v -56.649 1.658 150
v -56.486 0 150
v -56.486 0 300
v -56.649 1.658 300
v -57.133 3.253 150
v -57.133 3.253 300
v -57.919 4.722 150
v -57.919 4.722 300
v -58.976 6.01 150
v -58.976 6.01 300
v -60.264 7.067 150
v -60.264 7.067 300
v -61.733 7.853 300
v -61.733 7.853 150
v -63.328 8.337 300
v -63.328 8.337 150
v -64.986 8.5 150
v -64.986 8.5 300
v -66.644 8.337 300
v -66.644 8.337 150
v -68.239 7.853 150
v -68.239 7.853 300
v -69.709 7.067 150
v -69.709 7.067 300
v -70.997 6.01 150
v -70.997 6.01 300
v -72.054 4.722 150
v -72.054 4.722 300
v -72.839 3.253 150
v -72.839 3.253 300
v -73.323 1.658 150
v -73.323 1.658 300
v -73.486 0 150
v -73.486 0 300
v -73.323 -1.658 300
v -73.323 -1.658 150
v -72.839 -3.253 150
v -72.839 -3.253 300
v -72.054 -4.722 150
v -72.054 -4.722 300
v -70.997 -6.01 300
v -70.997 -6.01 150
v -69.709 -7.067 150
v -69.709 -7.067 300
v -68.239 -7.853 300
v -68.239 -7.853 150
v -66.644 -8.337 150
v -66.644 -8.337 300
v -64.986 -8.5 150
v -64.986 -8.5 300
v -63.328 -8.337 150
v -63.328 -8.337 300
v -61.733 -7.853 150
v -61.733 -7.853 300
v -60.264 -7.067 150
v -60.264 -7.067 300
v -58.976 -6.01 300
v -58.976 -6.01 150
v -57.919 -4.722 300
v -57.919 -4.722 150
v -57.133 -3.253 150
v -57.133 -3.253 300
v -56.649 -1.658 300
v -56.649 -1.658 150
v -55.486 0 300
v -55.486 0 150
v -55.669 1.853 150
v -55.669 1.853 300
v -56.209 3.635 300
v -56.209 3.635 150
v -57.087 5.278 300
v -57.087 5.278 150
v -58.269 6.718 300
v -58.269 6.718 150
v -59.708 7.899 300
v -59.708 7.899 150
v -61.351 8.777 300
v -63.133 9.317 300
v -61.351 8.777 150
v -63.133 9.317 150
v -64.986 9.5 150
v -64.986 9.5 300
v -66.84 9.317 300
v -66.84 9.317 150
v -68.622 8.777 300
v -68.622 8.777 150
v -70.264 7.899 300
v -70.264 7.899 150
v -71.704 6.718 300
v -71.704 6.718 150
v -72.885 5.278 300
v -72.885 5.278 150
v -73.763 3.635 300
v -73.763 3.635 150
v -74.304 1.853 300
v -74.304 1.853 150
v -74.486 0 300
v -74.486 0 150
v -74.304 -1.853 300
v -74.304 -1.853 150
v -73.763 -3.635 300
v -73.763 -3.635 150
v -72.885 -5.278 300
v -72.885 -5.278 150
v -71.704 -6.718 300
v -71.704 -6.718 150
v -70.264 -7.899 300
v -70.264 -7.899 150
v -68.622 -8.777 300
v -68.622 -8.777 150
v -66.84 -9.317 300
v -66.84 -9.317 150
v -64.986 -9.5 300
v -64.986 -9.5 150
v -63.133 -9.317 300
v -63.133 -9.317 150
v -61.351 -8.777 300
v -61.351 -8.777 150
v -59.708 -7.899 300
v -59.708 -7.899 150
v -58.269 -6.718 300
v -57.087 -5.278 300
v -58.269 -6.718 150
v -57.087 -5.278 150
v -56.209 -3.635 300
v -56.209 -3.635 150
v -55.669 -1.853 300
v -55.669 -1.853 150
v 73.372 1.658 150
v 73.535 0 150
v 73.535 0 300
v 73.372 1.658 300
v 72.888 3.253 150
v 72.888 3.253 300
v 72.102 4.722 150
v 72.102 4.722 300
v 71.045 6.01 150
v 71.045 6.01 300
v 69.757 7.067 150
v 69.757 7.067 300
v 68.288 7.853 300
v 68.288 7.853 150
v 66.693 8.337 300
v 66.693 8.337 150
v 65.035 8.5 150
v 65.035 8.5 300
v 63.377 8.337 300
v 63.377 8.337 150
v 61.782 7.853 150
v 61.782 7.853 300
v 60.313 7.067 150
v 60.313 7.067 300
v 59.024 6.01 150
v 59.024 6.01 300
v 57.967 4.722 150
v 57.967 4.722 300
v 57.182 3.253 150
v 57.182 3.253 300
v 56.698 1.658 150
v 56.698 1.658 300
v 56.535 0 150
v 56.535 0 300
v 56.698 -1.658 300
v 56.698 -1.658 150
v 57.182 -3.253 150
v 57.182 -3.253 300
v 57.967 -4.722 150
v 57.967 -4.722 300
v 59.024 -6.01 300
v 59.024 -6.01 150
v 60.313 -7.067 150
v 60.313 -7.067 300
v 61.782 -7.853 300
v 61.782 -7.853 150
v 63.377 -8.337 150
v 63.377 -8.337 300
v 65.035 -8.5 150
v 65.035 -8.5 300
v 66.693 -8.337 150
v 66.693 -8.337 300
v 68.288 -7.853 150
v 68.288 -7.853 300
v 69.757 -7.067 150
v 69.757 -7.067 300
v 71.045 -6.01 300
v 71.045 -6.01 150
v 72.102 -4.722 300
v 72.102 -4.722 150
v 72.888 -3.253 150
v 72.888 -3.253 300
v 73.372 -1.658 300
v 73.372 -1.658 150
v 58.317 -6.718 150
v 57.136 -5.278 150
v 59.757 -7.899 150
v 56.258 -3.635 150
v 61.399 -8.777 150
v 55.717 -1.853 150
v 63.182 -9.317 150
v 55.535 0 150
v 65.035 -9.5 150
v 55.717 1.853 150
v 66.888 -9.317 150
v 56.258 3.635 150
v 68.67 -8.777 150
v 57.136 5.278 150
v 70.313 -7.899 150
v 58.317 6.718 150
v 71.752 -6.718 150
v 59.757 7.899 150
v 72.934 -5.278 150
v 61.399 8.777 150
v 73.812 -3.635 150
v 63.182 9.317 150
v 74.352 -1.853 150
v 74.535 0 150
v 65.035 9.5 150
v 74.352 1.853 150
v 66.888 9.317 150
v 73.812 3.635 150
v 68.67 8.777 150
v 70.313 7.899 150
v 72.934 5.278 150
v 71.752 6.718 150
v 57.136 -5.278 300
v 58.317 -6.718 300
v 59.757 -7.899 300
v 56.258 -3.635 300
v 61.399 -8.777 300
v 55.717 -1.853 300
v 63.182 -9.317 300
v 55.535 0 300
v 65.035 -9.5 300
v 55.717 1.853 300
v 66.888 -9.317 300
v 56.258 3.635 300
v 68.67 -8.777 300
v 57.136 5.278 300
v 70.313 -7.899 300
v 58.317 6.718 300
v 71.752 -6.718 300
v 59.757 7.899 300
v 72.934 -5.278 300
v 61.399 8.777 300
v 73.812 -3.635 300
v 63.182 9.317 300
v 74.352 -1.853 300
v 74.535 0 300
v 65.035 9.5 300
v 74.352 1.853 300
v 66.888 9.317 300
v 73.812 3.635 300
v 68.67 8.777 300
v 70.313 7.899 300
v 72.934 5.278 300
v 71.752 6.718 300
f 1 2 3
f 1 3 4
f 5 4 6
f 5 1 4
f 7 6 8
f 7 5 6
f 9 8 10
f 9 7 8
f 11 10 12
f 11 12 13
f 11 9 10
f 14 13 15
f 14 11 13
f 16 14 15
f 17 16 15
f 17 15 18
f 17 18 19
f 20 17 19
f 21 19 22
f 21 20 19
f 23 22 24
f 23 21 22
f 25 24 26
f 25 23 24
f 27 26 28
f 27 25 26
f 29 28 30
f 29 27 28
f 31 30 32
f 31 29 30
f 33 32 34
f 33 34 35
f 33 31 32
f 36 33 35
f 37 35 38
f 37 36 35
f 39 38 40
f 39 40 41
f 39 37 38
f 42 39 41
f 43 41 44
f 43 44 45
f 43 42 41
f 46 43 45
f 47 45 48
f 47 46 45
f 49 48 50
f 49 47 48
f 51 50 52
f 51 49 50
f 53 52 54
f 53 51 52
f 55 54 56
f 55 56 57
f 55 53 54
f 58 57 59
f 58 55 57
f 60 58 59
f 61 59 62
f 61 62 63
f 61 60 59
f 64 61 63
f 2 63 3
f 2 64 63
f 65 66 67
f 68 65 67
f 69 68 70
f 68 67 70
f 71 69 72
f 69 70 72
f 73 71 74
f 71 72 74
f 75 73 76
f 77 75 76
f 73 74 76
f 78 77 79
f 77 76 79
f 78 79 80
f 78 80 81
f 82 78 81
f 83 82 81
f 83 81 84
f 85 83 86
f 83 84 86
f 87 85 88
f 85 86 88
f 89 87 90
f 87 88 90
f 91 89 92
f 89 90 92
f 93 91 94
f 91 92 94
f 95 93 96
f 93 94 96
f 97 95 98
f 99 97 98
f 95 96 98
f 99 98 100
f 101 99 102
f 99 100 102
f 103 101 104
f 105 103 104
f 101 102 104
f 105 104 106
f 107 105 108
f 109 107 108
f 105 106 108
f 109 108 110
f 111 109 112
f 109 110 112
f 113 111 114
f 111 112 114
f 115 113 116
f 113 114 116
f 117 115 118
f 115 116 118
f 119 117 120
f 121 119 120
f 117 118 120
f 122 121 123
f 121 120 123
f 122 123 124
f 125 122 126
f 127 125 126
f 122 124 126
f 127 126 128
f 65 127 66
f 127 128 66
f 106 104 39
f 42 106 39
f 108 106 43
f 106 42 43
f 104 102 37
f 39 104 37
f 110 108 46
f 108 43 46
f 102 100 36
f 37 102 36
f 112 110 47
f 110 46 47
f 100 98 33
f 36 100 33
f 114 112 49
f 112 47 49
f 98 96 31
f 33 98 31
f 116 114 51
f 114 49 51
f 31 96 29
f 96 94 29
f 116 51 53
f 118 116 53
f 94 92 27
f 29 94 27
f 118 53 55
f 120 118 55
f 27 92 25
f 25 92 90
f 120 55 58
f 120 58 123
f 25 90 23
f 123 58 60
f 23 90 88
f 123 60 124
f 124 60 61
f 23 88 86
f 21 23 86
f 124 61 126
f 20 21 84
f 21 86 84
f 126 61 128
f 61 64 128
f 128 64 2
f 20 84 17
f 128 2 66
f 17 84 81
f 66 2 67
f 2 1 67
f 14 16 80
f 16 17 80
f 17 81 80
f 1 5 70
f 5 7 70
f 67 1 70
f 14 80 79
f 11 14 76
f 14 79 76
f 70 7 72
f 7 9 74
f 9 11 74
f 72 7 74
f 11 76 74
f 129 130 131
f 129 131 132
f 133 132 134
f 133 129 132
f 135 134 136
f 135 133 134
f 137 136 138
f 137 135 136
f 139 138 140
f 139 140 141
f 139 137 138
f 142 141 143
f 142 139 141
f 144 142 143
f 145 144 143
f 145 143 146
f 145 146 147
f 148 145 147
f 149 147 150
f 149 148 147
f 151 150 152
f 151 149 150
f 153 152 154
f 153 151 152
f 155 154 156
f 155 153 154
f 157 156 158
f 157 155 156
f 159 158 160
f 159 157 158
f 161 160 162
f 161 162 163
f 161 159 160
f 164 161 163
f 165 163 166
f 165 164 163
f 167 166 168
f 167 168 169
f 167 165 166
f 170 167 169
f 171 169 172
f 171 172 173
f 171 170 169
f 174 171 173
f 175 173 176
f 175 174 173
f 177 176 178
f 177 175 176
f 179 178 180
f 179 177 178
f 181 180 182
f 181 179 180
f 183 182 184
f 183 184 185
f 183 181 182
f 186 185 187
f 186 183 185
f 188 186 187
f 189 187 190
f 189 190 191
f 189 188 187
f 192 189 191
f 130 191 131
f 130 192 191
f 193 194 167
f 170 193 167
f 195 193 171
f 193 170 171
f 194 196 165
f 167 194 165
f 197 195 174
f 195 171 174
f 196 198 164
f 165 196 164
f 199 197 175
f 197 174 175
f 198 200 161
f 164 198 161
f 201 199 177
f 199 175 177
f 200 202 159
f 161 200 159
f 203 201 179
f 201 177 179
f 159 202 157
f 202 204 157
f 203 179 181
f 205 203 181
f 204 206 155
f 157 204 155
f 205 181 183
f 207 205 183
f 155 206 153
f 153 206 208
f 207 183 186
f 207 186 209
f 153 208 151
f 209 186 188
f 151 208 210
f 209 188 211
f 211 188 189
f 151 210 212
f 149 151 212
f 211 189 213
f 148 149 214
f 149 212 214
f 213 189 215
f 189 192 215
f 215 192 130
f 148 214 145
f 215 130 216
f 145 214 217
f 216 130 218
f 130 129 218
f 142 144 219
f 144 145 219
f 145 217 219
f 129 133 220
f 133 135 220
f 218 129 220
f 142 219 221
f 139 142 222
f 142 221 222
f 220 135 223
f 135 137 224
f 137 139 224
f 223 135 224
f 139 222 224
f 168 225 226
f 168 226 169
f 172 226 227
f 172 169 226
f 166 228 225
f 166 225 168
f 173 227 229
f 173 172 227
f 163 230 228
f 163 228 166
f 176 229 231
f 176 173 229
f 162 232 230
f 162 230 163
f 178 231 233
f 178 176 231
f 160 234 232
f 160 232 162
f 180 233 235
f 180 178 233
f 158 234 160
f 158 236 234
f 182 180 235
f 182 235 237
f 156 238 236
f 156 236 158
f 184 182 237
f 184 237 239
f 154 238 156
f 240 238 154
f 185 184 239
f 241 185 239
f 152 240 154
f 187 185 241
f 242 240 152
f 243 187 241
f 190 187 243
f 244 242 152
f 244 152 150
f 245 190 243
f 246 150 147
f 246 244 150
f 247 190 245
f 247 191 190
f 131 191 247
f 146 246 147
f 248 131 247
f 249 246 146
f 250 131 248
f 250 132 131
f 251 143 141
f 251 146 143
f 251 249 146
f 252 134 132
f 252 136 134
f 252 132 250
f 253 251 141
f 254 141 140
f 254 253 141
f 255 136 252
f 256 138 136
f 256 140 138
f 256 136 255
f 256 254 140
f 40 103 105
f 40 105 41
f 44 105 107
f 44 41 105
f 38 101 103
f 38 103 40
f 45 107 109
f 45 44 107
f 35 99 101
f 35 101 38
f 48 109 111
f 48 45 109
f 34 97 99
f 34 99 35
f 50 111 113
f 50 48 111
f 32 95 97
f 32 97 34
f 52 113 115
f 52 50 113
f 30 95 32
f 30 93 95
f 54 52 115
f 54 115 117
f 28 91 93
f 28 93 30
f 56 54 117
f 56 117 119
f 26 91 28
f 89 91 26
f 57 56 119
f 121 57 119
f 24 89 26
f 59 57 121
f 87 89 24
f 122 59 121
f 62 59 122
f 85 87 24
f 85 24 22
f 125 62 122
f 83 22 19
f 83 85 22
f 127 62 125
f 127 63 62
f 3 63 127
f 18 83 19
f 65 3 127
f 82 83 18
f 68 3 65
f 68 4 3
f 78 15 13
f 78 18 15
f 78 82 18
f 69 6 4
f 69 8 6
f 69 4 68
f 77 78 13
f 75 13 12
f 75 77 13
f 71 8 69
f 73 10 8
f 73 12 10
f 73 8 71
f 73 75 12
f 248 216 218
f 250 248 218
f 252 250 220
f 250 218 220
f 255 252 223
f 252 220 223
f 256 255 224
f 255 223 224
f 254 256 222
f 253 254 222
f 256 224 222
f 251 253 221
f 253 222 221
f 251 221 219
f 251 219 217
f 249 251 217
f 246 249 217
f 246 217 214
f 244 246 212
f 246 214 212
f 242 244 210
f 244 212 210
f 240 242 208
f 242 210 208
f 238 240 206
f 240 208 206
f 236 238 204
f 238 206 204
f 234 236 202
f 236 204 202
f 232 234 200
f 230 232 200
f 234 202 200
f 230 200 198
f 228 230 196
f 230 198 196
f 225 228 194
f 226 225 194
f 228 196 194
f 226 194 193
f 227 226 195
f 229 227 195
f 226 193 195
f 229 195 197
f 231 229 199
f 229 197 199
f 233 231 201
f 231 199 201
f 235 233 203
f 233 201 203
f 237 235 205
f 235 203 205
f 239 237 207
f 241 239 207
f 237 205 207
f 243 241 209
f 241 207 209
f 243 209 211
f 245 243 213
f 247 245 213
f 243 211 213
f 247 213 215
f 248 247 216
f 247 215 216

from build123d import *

# Parameters (mm, degrees)
F0_R     = 75
F0_R_2   = 9.5
F0_R_3   = 55
F1_DEPTH = 150
F2_R     = 75
F3_DEPTH = 5
F4_R     = 9.5
F4_R_2   = 8.5
F6_DEPTH = 150
F4_R_3   = 4.5949512094


# Not quite as in the source:
# - the program builds the solid bodies; features that only make, move or delete a surface that nothing else refers to are left out


with BuildPart() as f1:
    # F0 (on Top) → F1 (new body)
    with BuildSketch(Plane.XY):
        Circle(F0_R)
        with Locations((-64.9861544371, 0)):
            Circle(F0_R_2, mode=Mode.SUBTRACT)
        Circle(F0_R_3, mode=Mode.SUBTRACT)
        with Locations((65.034866333, 0)):
            Circle(F0_R_2, mode=Mode.SUBTRACT)
    extrude(amount=F1_DEPTH)

    # F2 (on face) → F3 (join)
    with BuildSketch(Plane(origin=(0, 0, 0), x_dir=(1, 0, 0), z_dir=(0, 0, -1))):
        Circle(F2_R)
    extrude(amount=F3_DEPTH)


with BuildPart() as f6:
    # F4 (on face) → F6 (new body)
    with BuildSketch(Plane.XY.offset(150)):
        with Locations((65.034866333, 0)):
            Circle(F4_R)
        with Locations((65.034866333, 0)):
            Circle(F4_R_2, mode=Mode.SUBTRACT)
    extrude(amount=F6_DEPTH)


with BuildPart() as f6b:
    # F4 (on face) → F6, piece 2 (new body)
    with BuildSketch(Plane.XY.offset(150)):
        with Locations((-64.9861544371, 0)):
            Circle(F4_R)
        with Locations((-64.9861544371, 0)):
            Circle(F4_R_2, mode=Mode.SUBTRACT)
    extrude(amount=F6_DEPTH)


with BuildPart() as f6c:
    # F4 (on face) → F6, piece 3 (new body)
    with BuildSketch(Plane.XY.offset(150)):
        with Locations((-6.2923626974, 0)):
            Circle(F4_R_3)
    extrude(amount=F6_DEPTH)


solid = Compound([f6.part, f6b.part])
